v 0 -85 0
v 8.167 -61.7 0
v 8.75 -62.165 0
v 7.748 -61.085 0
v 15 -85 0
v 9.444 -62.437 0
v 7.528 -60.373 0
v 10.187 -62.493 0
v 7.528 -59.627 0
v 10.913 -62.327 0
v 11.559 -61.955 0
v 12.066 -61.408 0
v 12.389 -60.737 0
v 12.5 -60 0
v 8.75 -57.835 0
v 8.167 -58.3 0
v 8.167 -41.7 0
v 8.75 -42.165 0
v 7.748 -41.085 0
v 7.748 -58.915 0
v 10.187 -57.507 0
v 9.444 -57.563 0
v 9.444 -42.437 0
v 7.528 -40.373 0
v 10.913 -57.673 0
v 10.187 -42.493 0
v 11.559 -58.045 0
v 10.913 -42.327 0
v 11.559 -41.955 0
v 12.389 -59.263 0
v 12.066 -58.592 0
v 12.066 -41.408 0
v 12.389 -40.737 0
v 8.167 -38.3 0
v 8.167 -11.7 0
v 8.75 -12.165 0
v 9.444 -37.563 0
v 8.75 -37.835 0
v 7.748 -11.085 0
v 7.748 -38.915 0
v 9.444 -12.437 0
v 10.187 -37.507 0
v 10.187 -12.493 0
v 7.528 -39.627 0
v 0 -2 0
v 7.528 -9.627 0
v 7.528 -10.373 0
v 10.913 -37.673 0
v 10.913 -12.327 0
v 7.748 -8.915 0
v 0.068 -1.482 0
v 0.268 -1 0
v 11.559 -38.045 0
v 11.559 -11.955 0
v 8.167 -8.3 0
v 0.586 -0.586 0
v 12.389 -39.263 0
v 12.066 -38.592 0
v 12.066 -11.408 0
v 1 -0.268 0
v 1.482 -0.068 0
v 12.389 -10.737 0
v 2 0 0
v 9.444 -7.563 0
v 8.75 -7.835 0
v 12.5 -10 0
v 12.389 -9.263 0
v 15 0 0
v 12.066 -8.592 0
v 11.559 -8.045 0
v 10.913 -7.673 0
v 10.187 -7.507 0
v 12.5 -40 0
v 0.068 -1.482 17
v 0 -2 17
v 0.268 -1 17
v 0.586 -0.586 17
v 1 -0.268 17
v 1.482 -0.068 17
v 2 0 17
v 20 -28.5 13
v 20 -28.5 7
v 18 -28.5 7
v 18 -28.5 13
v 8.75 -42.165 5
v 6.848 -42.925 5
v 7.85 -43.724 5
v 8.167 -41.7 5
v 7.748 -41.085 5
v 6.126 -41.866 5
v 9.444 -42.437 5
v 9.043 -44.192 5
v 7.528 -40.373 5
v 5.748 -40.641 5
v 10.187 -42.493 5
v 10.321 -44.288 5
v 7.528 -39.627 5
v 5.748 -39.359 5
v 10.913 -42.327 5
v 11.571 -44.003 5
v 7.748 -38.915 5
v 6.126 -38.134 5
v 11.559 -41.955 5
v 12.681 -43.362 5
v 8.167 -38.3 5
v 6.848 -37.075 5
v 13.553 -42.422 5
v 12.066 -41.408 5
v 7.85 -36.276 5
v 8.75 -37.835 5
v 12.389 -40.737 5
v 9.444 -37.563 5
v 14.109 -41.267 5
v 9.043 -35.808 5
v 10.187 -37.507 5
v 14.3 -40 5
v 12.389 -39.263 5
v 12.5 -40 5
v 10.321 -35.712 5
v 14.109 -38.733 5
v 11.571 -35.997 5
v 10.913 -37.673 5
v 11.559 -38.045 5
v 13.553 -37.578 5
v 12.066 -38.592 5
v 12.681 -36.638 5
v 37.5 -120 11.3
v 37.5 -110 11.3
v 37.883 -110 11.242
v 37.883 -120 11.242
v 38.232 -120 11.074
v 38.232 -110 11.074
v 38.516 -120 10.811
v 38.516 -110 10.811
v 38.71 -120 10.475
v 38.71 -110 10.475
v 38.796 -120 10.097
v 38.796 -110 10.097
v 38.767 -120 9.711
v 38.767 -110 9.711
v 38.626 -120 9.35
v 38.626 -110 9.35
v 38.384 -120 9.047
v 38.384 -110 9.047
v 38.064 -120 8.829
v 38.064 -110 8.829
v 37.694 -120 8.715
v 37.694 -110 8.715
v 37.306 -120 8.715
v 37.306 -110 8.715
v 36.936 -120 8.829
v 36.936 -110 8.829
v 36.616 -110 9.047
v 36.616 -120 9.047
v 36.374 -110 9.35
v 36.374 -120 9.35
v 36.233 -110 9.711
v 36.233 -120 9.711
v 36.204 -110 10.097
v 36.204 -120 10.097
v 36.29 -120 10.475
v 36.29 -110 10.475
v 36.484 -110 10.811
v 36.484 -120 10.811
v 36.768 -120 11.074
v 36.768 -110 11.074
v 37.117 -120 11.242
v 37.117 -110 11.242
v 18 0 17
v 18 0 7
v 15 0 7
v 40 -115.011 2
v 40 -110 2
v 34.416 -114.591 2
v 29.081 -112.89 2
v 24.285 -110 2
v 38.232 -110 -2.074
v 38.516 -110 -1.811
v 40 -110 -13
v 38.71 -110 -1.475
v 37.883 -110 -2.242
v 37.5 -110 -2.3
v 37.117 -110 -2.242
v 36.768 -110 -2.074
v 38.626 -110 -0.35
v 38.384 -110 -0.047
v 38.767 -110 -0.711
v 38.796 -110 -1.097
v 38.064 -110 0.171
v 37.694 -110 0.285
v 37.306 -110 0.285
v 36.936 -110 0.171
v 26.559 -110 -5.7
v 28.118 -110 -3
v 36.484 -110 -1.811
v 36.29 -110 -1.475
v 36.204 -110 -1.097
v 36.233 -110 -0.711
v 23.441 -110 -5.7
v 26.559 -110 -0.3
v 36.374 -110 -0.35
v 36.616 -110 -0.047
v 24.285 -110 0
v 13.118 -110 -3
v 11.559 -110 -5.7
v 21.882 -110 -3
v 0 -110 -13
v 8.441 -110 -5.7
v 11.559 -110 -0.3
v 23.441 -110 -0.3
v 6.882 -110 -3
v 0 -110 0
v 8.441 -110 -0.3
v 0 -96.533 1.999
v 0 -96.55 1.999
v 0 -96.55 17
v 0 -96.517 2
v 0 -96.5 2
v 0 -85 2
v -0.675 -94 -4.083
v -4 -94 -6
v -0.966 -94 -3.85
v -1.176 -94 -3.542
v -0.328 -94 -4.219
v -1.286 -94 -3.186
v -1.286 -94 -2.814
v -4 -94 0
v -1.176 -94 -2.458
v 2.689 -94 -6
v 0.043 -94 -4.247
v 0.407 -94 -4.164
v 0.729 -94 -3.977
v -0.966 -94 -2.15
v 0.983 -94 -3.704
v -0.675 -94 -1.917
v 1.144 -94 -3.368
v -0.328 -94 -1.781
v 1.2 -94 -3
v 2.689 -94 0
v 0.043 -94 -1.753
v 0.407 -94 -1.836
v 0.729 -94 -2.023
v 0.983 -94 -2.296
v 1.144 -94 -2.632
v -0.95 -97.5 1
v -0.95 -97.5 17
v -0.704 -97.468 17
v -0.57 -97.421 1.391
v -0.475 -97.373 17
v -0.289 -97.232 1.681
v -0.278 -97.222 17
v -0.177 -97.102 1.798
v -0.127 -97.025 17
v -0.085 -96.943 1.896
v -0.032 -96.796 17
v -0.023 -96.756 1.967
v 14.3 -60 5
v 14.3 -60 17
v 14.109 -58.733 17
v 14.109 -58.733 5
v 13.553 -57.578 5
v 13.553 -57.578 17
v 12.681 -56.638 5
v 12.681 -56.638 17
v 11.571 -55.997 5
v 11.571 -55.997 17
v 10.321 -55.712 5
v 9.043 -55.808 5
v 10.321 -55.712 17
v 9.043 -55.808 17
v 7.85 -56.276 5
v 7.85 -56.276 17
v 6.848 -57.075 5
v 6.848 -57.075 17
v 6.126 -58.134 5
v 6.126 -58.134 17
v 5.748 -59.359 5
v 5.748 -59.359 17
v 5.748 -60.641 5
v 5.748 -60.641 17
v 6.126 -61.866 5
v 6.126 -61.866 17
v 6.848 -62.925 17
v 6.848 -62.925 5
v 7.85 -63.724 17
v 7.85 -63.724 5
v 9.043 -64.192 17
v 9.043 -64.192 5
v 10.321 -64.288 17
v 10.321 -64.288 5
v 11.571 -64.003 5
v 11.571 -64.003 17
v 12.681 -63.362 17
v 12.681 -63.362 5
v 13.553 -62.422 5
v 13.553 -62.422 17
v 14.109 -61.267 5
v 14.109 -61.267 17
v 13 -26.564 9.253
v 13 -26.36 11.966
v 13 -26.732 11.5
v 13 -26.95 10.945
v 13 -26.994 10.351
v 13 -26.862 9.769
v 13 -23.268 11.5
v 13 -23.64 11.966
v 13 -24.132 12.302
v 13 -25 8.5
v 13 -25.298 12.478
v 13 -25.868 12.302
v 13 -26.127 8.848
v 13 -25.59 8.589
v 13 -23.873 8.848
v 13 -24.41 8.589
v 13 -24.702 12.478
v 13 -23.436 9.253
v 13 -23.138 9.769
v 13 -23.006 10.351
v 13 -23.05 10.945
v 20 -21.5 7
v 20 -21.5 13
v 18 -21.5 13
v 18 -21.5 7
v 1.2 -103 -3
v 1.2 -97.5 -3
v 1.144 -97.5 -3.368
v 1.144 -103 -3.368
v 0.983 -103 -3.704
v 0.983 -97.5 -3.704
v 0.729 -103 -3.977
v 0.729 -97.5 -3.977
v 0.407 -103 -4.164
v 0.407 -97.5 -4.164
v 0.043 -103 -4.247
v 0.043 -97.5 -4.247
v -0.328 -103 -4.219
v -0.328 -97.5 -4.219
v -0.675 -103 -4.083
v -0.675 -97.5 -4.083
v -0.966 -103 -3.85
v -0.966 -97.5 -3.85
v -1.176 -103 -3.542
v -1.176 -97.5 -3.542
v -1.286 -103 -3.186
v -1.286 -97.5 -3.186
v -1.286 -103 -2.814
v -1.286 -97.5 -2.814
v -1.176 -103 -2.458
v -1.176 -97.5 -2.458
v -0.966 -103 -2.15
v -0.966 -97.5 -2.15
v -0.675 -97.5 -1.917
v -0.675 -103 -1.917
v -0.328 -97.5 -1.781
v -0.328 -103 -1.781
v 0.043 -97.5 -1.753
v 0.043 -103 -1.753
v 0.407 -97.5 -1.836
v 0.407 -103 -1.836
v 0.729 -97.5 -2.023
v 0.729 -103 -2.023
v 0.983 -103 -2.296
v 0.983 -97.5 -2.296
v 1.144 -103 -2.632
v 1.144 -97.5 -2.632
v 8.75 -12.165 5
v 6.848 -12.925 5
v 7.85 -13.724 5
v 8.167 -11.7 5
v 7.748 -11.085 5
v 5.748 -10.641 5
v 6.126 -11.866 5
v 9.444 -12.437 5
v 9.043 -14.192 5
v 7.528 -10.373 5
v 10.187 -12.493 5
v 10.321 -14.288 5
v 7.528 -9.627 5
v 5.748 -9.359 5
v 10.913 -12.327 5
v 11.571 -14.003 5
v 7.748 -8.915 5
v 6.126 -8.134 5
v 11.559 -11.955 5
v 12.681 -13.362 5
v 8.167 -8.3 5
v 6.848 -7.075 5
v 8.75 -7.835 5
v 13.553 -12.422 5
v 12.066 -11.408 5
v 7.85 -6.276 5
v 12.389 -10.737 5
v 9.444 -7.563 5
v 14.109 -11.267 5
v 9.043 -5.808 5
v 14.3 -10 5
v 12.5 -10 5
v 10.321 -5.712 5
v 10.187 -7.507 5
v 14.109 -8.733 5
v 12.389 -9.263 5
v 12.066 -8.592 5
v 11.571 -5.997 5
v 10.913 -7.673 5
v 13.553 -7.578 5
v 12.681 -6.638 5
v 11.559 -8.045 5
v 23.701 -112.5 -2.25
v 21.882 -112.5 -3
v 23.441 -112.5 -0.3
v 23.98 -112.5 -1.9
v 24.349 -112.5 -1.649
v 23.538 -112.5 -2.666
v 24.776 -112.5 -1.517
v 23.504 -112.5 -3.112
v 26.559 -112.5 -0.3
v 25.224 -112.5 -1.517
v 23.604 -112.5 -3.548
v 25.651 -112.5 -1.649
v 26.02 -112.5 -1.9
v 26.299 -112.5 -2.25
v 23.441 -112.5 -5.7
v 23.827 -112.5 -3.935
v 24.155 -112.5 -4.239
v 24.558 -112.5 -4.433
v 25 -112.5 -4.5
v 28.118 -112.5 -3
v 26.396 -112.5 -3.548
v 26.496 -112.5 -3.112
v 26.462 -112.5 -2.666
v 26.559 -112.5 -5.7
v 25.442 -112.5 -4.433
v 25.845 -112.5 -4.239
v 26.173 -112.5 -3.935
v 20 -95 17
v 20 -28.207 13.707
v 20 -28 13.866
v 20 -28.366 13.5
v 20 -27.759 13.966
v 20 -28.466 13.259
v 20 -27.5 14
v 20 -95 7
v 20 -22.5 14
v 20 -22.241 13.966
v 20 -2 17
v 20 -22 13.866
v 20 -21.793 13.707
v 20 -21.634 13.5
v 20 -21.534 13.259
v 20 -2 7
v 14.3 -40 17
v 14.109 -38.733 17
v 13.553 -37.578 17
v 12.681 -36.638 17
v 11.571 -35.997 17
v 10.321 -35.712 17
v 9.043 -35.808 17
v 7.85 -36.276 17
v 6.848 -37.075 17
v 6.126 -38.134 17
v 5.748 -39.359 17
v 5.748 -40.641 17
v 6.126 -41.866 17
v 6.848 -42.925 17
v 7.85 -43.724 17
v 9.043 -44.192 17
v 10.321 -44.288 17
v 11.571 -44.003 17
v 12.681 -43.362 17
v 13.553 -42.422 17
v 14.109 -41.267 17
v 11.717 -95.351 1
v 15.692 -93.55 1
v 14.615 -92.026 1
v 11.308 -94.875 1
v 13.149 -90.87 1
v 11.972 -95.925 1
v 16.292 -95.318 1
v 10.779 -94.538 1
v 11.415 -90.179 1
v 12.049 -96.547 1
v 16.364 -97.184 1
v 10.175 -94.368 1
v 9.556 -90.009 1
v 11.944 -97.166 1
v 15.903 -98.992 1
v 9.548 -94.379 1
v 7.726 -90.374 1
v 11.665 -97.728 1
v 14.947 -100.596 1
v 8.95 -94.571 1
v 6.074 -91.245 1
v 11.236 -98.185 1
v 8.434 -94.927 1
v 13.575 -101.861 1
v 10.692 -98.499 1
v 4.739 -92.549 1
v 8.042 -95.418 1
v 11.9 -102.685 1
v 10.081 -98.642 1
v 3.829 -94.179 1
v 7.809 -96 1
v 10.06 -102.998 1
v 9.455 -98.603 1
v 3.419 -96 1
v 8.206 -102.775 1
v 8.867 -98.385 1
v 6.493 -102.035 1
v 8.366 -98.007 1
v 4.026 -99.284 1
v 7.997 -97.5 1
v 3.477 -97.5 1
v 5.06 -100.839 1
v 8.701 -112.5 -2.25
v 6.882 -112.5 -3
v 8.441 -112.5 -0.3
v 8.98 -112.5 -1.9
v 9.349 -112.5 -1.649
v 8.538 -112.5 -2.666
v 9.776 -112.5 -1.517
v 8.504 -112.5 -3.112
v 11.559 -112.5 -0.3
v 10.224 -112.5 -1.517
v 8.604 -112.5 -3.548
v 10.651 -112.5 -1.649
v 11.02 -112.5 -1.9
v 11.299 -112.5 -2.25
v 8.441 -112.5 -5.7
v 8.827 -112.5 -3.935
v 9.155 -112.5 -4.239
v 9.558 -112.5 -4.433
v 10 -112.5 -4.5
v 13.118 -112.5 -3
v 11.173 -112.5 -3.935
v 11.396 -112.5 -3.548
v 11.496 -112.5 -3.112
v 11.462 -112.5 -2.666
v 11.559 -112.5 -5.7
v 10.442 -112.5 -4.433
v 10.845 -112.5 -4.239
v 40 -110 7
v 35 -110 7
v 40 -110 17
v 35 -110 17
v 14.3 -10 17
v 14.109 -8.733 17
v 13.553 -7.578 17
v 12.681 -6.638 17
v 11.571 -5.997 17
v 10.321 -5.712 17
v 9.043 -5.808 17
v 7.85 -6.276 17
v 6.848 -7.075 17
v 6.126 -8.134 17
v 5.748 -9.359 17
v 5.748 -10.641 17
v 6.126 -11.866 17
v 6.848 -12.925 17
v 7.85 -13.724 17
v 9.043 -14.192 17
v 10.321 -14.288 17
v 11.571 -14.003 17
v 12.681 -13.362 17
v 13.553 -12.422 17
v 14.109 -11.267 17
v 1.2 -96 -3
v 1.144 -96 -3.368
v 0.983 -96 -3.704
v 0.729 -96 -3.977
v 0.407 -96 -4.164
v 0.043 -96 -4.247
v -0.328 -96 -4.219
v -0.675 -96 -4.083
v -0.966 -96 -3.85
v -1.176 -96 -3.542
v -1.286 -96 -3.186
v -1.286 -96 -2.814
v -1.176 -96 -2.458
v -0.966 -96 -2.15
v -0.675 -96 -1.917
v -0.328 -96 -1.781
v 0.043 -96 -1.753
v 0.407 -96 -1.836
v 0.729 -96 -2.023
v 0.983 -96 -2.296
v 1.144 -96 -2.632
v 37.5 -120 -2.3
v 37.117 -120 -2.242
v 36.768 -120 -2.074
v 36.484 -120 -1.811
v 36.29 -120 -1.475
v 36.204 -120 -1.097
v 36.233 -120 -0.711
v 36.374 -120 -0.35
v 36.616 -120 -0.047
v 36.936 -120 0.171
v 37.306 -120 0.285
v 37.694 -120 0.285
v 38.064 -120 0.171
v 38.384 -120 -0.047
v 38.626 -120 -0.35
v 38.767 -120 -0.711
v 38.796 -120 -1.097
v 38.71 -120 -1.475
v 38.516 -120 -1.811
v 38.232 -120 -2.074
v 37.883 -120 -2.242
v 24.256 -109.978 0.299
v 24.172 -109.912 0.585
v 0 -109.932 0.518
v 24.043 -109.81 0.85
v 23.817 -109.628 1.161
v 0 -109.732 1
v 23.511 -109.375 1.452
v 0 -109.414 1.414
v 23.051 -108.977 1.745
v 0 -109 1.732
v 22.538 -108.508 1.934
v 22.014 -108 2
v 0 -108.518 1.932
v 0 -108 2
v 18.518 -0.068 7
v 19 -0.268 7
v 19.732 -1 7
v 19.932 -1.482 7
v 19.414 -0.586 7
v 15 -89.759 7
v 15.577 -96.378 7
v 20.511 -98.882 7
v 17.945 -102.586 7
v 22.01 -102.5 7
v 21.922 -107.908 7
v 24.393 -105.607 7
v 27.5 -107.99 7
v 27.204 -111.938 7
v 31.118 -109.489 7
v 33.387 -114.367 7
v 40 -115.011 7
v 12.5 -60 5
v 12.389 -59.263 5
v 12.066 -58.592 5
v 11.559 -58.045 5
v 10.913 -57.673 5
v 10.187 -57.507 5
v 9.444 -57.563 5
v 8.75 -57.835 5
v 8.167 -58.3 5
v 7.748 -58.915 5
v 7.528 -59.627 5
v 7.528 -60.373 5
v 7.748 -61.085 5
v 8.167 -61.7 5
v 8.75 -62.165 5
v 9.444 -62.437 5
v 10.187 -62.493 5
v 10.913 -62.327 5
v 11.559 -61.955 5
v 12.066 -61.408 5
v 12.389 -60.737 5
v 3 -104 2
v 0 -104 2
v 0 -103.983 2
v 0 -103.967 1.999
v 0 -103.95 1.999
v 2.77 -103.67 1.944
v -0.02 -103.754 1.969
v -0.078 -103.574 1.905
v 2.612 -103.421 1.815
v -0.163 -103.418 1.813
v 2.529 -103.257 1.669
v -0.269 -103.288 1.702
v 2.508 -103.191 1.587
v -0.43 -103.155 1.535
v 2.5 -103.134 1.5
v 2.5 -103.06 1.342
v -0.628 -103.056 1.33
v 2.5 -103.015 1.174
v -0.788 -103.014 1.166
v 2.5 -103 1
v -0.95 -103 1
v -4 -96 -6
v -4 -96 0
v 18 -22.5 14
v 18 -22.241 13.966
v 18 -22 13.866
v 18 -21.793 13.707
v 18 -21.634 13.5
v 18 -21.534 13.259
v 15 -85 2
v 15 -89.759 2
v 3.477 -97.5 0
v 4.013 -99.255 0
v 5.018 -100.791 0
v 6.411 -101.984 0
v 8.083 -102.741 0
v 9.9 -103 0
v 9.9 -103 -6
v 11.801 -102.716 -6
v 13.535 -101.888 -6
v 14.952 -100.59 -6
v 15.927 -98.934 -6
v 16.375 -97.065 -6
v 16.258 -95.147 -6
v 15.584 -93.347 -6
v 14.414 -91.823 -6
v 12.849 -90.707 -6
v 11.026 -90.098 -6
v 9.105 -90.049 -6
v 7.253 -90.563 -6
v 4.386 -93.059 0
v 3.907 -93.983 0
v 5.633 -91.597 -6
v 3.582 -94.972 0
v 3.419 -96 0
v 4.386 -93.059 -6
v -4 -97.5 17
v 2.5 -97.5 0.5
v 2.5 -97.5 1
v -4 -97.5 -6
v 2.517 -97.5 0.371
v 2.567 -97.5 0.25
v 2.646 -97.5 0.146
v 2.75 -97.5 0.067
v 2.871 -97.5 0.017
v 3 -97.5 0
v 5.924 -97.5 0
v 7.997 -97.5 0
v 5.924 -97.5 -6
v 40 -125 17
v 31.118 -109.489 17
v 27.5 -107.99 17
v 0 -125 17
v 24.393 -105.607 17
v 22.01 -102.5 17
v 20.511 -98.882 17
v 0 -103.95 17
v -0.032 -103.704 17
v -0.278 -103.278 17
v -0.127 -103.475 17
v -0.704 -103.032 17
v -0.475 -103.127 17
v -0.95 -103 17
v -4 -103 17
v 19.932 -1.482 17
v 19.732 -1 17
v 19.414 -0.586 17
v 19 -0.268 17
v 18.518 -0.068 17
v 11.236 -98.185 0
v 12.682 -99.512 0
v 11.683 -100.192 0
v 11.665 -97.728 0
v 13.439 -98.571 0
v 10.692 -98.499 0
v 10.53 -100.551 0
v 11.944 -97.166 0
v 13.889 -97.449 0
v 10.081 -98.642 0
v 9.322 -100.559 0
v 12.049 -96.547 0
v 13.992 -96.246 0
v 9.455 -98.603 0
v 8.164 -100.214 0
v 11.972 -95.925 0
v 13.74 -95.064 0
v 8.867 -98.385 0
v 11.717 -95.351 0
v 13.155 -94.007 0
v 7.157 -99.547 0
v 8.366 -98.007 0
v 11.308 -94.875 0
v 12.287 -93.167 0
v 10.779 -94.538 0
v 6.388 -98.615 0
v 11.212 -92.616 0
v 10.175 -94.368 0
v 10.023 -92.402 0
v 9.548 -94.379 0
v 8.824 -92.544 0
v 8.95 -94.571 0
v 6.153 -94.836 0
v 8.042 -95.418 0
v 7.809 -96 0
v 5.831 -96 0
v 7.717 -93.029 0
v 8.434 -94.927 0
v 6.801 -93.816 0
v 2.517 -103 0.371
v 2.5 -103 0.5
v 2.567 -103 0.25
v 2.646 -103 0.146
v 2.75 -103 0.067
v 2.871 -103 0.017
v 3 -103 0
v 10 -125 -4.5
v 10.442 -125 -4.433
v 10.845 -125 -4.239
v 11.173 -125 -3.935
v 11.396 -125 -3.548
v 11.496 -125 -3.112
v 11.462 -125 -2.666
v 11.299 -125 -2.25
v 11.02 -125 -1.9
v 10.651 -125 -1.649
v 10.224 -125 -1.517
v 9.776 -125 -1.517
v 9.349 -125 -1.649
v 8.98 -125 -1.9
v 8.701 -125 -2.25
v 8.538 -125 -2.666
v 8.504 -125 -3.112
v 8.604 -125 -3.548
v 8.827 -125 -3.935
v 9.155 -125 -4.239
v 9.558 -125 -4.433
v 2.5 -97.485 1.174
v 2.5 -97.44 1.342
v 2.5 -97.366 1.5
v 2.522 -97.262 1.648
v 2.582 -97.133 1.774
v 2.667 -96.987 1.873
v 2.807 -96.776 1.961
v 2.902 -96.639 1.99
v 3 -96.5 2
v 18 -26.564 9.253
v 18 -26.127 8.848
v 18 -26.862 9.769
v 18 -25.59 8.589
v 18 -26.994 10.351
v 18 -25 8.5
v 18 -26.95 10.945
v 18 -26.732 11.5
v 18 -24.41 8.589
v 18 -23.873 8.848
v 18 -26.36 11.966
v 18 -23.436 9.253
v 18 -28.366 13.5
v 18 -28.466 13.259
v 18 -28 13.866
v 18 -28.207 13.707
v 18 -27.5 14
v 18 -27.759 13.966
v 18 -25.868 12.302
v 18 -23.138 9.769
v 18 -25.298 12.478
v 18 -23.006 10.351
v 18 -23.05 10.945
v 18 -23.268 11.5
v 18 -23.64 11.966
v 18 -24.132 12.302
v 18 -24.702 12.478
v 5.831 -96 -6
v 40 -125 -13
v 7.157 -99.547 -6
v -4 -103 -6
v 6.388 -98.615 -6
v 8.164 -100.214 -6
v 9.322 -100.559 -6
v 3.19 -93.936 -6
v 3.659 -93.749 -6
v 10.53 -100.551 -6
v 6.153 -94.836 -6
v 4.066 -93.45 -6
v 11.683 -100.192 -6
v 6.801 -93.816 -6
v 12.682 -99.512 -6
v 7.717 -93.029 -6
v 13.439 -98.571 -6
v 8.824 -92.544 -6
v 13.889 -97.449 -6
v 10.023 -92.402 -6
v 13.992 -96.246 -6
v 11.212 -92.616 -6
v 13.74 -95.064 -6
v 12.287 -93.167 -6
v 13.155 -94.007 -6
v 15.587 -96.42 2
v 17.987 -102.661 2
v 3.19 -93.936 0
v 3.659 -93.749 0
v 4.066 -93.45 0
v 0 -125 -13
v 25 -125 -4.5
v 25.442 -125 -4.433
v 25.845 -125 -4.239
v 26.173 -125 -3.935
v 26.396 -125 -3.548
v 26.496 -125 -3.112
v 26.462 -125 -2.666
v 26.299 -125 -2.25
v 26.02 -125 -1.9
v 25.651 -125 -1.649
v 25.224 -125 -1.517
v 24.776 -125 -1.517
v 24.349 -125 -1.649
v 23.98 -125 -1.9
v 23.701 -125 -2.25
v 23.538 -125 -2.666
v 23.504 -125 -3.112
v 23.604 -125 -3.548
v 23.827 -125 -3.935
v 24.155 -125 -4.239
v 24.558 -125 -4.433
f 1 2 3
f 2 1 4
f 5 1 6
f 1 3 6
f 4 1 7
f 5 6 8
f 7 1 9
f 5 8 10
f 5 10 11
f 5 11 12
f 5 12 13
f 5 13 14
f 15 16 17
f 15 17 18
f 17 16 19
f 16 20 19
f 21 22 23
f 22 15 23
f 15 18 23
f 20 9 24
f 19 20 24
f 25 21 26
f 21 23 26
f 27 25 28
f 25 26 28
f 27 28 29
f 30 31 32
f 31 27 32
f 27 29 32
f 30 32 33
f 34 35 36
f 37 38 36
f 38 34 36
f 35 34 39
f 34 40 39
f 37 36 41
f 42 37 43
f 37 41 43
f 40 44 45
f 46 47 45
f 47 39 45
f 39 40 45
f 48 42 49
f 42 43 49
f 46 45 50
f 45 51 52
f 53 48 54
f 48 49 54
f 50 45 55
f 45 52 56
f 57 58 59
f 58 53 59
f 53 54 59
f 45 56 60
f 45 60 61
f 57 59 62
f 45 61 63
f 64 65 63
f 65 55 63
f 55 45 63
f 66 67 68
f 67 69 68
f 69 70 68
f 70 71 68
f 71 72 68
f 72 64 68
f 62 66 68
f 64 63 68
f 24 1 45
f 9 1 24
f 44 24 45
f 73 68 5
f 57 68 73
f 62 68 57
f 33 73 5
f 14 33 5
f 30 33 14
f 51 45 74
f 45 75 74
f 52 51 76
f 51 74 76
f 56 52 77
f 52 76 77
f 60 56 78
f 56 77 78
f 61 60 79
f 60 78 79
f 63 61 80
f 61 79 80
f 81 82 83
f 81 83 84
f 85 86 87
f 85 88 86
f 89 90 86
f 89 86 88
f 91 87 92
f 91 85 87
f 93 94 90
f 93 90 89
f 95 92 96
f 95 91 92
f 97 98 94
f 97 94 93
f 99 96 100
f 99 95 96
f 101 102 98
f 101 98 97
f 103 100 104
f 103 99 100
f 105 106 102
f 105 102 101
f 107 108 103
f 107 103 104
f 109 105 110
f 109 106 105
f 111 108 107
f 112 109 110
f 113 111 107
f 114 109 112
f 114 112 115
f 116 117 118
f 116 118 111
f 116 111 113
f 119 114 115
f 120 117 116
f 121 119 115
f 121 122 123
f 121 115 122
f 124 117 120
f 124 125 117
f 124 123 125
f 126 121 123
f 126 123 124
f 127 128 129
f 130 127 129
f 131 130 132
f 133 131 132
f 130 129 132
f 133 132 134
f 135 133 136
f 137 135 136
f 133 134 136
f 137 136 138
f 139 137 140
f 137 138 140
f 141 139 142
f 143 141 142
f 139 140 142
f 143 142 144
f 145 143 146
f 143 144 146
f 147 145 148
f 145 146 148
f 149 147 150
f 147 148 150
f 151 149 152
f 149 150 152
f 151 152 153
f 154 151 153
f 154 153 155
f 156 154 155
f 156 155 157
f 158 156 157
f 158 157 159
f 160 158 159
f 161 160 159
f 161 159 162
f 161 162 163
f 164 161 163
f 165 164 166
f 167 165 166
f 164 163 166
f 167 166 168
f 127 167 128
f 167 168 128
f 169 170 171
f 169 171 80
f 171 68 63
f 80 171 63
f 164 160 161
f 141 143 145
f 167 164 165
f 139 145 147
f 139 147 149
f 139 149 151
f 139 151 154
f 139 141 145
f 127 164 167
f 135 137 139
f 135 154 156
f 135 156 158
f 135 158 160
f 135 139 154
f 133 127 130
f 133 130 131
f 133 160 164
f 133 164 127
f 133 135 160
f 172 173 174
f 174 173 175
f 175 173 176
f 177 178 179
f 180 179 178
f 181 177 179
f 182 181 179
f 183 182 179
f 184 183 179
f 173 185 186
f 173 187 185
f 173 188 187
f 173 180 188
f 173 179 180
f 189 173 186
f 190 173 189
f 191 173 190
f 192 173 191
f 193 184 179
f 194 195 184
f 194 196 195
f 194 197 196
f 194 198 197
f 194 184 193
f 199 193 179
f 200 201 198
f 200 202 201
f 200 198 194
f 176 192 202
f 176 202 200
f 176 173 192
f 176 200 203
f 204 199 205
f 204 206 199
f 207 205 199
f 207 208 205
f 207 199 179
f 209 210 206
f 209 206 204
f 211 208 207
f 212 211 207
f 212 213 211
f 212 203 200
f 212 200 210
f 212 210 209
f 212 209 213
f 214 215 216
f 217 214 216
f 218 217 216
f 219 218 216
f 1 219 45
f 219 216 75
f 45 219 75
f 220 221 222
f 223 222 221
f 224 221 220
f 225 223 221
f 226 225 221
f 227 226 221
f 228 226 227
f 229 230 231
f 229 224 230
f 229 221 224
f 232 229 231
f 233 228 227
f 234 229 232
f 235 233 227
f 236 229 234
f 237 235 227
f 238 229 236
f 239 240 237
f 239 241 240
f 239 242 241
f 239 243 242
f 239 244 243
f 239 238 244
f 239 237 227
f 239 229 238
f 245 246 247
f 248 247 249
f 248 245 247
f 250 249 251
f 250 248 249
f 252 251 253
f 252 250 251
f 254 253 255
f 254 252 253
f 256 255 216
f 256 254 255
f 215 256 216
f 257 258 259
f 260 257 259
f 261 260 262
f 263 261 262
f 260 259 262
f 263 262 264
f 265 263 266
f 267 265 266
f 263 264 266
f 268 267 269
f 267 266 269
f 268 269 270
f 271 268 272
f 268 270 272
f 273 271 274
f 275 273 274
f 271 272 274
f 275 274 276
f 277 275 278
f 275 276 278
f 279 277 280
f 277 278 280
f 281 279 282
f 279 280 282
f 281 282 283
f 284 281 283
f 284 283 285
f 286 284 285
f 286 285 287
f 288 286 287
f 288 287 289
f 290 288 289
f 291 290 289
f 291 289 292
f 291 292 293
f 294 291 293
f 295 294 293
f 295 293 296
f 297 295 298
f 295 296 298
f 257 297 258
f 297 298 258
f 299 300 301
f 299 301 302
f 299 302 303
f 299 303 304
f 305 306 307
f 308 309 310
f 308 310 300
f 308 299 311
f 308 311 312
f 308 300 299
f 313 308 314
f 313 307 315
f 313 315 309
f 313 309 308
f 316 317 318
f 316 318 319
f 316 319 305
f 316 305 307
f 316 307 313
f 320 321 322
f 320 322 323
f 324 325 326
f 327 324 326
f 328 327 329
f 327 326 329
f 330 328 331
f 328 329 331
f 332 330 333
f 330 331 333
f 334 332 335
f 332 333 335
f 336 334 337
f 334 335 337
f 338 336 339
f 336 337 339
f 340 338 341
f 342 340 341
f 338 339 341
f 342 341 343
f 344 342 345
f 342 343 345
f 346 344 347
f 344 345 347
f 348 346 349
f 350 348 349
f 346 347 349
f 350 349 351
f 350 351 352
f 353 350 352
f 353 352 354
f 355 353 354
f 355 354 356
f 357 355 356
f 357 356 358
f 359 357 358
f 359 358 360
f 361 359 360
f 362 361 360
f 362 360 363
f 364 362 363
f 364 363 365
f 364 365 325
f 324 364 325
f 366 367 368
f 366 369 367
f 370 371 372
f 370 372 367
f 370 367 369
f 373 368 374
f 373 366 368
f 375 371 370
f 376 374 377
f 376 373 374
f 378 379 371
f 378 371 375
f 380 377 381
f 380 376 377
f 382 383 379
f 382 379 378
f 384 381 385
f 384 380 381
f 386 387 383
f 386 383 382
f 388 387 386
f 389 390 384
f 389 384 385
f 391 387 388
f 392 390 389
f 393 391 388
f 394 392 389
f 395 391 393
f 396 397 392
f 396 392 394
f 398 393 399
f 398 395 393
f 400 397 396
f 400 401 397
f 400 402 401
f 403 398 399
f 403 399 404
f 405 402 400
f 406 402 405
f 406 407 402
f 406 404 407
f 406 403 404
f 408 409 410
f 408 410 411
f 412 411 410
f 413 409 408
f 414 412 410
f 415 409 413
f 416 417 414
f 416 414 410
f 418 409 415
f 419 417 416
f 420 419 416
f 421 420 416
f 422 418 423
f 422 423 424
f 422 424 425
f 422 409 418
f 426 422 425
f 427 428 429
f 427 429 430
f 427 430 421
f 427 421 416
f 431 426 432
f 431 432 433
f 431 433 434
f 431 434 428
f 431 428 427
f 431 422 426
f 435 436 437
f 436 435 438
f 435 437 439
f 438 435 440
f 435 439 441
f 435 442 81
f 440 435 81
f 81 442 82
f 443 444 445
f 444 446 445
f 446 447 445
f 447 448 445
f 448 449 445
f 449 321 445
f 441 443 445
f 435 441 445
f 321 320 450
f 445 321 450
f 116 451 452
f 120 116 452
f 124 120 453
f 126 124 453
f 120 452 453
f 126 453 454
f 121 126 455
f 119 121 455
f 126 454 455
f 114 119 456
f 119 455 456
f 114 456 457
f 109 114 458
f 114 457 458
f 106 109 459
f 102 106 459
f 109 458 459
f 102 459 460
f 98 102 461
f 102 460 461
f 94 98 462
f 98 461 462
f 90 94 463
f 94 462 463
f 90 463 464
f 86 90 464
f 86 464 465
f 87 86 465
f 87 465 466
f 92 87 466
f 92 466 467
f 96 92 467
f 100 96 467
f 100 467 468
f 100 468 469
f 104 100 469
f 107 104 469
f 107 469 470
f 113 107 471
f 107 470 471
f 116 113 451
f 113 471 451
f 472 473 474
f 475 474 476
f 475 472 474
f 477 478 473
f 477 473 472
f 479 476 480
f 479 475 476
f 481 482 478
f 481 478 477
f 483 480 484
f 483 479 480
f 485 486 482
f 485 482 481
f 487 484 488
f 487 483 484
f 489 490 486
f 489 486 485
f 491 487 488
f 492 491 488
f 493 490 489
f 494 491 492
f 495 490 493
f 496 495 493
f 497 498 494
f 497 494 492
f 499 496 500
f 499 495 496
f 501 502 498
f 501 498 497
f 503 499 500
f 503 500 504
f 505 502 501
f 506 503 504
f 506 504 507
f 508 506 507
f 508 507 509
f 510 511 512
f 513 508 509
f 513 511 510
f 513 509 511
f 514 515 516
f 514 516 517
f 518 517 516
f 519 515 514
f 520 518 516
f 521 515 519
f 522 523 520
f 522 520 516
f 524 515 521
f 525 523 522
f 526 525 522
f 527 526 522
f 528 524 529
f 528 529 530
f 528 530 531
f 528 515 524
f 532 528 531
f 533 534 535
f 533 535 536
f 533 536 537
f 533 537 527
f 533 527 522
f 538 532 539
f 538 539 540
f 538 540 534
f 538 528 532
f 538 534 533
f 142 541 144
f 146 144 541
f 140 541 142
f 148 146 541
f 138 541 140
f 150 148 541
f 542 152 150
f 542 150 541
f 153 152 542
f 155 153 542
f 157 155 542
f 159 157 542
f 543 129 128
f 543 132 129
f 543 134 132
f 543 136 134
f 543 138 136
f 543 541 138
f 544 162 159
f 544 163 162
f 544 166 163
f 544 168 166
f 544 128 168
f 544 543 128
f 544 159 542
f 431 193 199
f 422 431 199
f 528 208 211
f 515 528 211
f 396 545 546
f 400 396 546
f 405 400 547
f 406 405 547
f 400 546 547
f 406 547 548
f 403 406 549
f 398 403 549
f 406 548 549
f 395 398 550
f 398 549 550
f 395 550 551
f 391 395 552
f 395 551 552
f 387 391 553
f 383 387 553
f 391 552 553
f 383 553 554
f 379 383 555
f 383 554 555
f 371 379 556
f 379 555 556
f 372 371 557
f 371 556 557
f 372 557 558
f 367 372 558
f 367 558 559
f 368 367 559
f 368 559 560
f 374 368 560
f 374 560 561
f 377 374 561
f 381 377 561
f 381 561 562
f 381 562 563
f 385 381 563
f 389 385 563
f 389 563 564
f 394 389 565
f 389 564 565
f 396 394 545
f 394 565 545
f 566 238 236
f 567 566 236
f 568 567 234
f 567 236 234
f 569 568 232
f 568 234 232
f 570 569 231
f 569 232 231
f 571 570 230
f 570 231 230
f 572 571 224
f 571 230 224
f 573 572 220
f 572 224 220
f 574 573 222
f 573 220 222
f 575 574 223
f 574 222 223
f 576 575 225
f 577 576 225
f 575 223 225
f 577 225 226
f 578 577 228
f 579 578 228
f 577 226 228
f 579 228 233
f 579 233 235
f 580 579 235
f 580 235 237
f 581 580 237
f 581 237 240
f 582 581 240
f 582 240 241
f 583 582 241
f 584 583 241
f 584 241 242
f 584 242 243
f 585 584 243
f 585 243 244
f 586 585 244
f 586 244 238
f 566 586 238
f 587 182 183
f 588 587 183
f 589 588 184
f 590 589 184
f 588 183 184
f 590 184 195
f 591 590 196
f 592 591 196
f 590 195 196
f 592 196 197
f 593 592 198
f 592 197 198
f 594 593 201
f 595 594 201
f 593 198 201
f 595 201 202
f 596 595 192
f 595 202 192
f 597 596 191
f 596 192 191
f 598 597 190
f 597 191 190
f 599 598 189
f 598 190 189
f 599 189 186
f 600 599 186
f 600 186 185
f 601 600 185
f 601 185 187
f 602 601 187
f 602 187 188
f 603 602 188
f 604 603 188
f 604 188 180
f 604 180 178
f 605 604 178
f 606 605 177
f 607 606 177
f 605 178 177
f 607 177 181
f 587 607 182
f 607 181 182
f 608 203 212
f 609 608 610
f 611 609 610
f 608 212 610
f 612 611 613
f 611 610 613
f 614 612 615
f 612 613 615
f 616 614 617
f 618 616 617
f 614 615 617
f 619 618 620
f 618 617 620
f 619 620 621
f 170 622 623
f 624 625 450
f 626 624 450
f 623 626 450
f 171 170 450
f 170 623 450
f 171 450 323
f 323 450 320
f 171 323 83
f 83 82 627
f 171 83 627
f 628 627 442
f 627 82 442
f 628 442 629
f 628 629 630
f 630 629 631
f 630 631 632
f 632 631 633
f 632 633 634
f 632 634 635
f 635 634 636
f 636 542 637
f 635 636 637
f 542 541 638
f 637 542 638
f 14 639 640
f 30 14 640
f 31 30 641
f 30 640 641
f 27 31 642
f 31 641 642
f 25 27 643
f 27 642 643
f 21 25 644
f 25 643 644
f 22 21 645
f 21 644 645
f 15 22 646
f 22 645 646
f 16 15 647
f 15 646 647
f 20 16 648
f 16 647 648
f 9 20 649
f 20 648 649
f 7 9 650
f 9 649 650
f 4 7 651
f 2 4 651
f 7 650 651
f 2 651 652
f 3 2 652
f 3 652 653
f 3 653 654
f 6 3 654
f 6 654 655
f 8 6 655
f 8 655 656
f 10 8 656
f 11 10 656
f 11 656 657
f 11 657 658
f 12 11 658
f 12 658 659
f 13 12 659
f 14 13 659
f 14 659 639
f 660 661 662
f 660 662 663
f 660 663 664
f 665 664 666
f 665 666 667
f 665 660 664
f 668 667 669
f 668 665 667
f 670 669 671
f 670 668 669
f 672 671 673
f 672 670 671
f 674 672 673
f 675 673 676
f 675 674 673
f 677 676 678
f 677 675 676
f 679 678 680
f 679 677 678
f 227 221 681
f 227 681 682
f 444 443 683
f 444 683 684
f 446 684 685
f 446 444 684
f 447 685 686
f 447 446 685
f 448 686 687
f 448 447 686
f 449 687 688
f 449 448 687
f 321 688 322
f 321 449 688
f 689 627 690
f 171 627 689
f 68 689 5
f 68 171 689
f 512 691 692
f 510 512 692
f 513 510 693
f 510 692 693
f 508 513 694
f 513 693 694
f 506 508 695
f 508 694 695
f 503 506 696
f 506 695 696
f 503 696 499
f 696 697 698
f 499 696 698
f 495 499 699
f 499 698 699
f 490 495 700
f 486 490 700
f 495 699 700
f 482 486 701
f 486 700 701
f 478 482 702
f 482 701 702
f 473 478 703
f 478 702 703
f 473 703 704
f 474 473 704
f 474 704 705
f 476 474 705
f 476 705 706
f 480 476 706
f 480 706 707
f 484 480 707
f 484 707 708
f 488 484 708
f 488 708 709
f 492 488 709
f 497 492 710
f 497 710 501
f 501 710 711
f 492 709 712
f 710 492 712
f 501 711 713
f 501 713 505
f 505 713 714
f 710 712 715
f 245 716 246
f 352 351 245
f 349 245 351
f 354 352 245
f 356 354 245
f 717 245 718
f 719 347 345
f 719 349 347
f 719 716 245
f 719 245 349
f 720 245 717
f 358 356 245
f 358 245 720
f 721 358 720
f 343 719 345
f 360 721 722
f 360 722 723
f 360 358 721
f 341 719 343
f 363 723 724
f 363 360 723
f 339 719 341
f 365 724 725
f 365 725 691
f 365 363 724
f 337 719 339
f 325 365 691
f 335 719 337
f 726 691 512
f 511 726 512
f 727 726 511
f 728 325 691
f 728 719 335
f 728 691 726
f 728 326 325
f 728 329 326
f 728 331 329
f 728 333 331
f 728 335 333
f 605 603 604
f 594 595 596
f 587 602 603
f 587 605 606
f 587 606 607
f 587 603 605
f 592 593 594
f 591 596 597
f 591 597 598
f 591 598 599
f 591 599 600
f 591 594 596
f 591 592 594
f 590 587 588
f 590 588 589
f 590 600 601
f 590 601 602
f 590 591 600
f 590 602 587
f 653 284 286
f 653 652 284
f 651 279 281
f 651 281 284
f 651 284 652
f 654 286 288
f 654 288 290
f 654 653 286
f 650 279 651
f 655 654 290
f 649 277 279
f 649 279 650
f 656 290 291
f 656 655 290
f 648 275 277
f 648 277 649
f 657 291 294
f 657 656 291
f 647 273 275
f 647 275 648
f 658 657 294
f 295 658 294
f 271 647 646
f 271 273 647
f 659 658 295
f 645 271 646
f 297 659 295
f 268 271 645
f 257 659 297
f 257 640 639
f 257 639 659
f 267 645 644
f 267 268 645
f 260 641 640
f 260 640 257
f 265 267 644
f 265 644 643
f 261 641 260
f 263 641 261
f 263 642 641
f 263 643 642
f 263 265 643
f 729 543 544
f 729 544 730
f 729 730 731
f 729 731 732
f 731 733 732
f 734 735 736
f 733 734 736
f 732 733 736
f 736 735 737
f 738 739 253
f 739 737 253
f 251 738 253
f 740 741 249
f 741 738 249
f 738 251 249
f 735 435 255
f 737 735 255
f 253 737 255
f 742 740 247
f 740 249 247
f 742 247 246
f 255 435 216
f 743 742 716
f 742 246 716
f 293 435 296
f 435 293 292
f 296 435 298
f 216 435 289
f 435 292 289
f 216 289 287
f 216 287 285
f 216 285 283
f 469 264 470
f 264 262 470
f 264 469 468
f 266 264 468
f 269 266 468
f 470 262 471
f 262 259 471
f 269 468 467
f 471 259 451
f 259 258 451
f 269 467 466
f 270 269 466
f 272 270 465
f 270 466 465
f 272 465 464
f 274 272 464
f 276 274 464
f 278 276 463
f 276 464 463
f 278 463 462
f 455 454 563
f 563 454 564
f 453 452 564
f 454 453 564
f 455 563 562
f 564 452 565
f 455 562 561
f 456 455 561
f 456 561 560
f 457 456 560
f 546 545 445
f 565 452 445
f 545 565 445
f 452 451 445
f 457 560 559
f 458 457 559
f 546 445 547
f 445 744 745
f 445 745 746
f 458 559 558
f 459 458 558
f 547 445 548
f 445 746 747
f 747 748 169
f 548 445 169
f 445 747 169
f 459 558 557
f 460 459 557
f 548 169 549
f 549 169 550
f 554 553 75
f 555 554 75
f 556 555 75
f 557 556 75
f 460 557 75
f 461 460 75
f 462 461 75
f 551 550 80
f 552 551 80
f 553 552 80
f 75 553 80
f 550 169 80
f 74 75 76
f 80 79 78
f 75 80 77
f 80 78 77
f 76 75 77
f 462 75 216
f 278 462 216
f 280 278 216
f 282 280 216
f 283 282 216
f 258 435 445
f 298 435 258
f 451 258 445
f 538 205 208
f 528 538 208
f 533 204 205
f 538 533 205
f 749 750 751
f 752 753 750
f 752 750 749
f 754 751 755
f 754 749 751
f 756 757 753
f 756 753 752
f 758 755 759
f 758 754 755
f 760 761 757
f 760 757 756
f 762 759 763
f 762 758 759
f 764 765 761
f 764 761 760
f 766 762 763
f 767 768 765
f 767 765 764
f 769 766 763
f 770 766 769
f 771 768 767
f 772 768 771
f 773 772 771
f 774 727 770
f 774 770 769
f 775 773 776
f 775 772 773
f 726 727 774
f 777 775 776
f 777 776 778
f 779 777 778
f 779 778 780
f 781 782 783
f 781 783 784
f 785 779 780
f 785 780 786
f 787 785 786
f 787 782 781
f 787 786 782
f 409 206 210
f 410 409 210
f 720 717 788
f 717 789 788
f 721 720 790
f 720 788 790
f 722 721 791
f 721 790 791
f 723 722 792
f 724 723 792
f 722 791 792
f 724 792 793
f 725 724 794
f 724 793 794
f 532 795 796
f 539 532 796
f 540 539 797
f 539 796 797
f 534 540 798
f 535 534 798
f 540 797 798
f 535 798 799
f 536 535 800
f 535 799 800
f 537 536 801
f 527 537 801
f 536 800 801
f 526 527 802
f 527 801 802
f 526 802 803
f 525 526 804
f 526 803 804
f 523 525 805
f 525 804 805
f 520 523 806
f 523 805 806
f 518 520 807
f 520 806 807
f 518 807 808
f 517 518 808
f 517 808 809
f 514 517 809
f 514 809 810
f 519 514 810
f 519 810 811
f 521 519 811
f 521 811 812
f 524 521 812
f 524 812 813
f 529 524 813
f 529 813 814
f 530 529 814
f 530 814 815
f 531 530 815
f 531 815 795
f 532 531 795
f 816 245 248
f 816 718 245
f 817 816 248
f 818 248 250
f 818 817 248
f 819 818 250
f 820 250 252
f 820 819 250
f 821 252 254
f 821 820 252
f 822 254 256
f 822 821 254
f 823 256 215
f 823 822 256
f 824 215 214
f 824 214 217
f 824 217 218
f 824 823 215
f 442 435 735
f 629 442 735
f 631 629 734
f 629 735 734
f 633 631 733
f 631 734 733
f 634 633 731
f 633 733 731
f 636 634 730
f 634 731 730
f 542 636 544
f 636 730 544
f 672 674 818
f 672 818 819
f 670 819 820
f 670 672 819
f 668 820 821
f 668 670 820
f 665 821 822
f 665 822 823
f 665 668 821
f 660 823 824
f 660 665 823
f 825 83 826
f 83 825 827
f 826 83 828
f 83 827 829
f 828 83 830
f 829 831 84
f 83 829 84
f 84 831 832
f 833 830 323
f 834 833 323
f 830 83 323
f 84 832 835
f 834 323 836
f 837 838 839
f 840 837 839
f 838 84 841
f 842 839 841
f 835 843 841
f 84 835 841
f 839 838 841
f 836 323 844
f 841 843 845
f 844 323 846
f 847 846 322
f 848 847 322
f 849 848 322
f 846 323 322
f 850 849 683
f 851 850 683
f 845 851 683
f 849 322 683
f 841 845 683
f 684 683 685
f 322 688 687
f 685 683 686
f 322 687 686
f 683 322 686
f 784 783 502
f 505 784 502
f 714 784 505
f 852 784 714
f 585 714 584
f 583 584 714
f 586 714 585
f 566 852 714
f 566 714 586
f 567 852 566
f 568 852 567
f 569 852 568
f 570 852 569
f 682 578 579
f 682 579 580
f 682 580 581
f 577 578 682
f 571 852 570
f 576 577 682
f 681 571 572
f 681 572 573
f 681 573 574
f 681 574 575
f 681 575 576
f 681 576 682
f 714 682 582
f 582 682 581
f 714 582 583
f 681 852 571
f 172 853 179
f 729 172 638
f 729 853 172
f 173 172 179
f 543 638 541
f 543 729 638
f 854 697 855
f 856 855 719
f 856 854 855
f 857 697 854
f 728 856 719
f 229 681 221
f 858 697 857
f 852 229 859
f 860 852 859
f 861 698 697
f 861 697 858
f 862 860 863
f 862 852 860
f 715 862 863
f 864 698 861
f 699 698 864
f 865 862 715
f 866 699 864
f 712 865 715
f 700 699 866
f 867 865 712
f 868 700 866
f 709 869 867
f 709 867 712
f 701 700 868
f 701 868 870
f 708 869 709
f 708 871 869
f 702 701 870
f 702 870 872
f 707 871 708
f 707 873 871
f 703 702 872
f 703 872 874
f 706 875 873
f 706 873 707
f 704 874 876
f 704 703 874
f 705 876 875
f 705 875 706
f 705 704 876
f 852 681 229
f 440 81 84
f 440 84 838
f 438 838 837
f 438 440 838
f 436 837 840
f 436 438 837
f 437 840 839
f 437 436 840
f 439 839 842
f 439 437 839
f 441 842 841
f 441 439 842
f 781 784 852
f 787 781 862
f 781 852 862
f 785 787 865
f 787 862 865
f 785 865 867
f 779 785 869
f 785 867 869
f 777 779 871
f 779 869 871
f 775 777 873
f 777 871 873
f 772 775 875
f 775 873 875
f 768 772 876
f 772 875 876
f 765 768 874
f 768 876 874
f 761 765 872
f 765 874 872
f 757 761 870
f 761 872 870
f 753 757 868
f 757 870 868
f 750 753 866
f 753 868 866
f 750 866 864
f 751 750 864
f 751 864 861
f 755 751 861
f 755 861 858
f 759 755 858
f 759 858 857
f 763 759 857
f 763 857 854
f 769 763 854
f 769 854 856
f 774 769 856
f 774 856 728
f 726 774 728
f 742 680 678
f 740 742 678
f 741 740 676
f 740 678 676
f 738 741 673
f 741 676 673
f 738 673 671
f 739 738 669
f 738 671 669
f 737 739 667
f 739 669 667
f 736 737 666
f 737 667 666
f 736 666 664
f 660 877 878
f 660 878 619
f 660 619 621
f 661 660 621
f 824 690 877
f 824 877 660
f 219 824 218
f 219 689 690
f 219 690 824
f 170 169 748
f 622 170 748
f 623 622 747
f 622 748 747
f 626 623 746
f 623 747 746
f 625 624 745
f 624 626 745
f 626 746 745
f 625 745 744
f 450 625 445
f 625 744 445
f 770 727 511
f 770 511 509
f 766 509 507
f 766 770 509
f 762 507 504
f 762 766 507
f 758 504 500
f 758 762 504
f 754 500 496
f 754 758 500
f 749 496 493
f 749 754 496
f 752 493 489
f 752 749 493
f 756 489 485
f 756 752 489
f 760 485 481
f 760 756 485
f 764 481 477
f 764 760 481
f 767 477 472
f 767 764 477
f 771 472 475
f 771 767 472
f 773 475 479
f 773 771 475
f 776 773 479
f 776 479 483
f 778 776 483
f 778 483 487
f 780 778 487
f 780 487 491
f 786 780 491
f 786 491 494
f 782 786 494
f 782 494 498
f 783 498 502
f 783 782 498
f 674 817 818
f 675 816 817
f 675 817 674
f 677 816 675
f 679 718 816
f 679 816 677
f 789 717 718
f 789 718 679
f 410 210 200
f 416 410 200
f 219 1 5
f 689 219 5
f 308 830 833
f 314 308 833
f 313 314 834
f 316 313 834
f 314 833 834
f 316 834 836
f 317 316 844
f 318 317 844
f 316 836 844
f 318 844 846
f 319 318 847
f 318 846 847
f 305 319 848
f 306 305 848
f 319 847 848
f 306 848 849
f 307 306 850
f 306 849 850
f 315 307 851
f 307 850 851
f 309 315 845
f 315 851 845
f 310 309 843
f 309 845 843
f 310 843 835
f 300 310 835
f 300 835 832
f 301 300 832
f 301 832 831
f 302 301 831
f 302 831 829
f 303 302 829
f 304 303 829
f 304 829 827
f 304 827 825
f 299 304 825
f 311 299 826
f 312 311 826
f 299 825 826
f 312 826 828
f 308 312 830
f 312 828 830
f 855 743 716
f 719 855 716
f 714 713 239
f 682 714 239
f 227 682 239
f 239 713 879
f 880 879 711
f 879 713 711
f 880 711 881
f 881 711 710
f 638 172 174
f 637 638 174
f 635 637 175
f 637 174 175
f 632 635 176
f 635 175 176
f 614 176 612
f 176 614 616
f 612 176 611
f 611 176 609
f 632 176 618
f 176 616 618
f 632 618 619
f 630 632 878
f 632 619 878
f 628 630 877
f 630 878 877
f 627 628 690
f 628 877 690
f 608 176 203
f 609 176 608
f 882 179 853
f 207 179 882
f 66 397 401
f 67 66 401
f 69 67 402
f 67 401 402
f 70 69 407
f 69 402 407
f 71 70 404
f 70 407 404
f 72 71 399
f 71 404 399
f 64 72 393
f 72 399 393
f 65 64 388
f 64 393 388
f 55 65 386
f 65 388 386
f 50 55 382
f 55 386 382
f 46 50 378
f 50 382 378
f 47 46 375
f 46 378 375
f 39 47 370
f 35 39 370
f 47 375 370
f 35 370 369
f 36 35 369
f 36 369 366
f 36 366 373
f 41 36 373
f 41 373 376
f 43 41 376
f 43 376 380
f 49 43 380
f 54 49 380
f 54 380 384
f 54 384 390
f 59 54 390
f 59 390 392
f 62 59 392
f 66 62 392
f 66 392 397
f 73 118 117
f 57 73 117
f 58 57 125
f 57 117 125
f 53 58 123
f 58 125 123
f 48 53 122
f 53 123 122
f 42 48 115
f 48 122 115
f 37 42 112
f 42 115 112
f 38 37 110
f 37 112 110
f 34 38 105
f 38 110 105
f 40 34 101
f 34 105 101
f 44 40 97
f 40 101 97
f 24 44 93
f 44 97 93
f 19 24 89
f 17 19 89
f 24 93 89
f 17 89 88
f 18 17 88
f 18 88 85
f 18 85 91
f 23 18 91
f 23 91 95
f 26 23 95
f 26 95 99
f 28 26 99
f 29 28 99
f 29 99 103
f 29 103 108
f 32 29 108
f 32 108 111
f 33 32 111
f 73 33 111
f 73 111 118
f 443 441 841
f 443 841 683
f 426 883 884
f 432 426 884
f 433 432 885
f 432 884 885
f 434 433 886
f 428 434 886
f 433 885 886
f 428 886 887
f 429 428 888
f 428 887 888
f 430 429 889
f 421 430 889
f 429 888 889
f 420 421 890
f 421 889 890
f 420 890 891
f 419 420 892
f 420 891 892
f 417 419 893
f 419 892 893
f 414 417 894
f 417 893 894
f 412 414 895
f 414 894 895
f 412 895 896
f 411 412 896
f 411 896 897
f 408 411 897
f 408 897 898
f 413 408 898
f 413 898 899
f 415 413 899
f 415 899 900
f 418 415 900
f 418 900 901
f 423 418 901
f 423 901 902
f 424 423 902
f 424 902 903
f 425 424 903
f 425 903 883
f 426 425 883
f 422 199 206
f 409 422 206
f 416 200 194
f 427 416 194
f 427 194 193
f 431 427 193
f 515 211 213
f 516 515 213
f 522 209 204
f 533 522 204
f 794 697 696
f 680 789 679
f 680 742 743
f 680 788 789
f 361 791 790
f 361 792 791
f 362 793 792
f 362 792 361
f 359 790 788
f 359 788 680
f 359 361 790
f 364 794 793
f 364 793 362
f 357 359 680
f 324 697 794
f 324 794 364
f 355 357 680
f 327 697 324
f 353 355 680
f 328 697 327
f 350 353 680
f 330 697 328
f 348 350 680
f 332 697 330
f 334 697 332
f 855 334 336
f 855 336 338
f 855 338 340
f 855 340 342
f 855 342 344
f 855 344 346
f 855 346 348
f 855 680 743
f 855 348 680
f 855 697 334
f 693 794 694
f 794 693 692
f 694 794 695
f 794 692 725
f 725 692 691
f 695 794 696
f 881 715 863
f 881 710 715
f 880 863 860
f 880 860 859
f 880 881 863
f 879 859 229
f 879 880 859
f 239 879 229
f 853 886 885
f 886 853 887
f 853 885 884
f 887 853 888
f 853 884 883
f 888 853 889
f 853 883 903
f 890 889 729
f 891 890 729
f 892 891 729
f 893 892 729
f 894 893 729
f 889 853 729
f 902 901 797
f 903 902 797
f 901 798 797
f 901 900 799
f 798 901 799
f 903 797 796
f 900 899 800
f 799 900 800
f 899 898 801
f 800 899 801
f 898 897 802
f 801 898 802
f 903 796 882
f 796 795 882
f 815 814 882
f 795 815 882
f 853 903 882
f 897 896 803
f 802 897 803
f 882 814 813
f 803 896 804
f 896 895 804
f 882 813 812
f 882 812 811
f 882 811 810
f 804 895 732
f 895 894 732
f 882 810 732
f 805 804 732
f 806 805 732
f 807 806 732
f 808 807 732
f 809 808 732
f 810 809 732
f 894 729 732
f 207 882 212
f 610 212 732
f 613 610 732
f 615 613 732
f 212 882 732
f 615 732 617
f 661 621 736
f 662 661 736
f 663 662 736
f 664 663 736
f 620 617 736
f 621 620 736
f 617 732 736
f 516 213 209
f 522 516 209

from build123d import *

# Parameters (mm, degrees)
BOSS_EXTRUDE1_DEPTH = 17
SKETCH3_W           = 40
SKETCH3_H           = 15
BOSS_EXTRUDE3_DEPTH = 13
FILLET1_R           = 15
SKETCH4_R           = 1.5000000000000004
SKETCH4_R_2         = 1.5000000000000007
CUT_EXTRUDE1_DEPTH  = 20
CUT_EXTRUDE2_DEPTH  = 2.5
SKETCH6_R           = 4.299999999999999
SKETCH6_R_2         = 4.299999999999998
SKETCH6_R_3         = 4.3
CUT_EXTRUDE3_DEPTH  = 12
SKETCH7_R           = 2.5000000000000004
SKETCH7_R_2         = 2.500000000000001
CUT_EXTRUDE4_DEPTH  = 12
CUT_EXTRUDE5_DEPTH  = 2
BOSS_EXTRUDE4_DEPTH = 23
BOSS_EXTRUDE5_DEPTH = 6
SKETCH11_W          = 6
SKETCH11_H          = 2
BOSS_EXTRUDE6_DEPTH = 4.419259302
SKETCH12_R          = 1.2500000000000002
CUT_EXTRUDE7_DEPTH  = 10
FILLET4_R           = 0.95
FILLET6_R           = 2
SKETCH13_R          = 6.500000000000007
SKETCH13_R_2        = 2.150000000000001
BOSS_EXTRUDE7_DEPTH = 1
SKETCH14_W          = 13.249650970727469
SKETCH14_H          = 1.5
CUT_EXTRUDE8_DEPTH  = 7
BOSS_EXTRUDE8_DEPTH = 10
SKETCH16_R          = 4.100000000000001
CUT_EXTRUDE9_DEPTH  = 6
CUT_EXTRUDE10_DEPTH = 5
SKETCH18_R          = 24.032057078793116
CUT_EXTRUDE11_DEPTH = 5
SKETCH20_R          = 1.3000000000000016
CUT_EXTRUDE12_DEPTH = 10
FILLET7_R           = 0.5
FILLET8_R           = 2
FILLET9_R           = 2
FILLET10_R          = 1
FILLET11_R          = 1
CUT_EXTRUDE15_DEPTH = 2
SKETCH24_R          = 2
CUT_EXTRUDE16_DEPTH = 5


with BuildPart() as part:
    # Sketch1 → Boss-Extrude1 (new body)
    with BuildSketch(Plane.XY):
        Polygon((0, 0), (1.531e-14, -125), (40.000000000000014, -125), (40.000000000000014, -110), (20.000000000000014, -110), (20.000000000000014, 0), align=None)
    extrude(amount=BOSS_EXTRUDE1_DEPTH)

    # Sketch3 → Boss-Extrude3 (add)
    with BuildSketch(Plane(origin=(0, 0, 0), x_dir=(-1, 0, 0), z_dir=(0, 0, -1))):
        with Locations((-20.000000000000014, -117.50000000000001)):
            Rectangle(SKETCH3_W, SKETCH3_H)
    extrude(amount=BOSS_EXTRUDE3_DEPTH)

    # Fillet1
    fillet1_edges = [part.edges().sort_by_distance(p)[0] for p in [
        (20.000000000000014, -110, 8.5),
    ]]
    fillet(fillet1_edges, radius=FILLET1_R)

    # Sketch4 → Cut-Extrude1 (cut)
    with BuildSketch(Plane.XZ.offset(125)):
        with Locations(Location((10.000000000000016, -2.999999999999999, 0), (0, 0, 270))):
            Circle(SKETCH4_R)
        with Locations(Location((25.000000000000014, -2.999999999999999, 0), (0, 0, 270))):
            Circle(SKETCH4_R_2)
    extrude(amount=-CUT_EXTRUDE1_DEPTH, mode=Mode.SUBTRACT)

    # Sketch5 → Cut-Extrude2 (cut)
    with BuildSketch(Plane(origin=(0, -110, 0), x_dir=(1, 0, 0), z_dir=(0, 1, 0))):
        Polygon((6.882308546376037, 3.0000000000000013), (8.441154273188026, 0.2999999999999986), (11.558845726812006, 0.2999999999999995), (13.117691453623996, 3.0000000000000018), (11.558845726812008, 5.7), (8.441154273188026, 5.699999999999998), align=None)
        Polygon((21.882308546376034, 2.999999999999999), (23.441154273188026, 0.2999999999999969), (26.558845726812, 0.29999999999999777), (28.117691453623994, 2.999999999999999), (26.558845726812, 5.6999999999999975), (23.441154273188022, 5.699999999999997), align=None)
    extrude(amount=-CUT_EXTRUDE2_DEPTH, mode=Mode.SUBTRACT)

    # Sketch6 → Cut-Extrude3 (cut)
    with BuildSketch(Plane.XY.offset(17)):
        with Locations((10.000000000000009, -10.000000000000002)):
            Circle(SKETCH6_R)
        with Locations((10.000000000000012, -40)):
            Circle(SKETCH6_R_2)
        with Locations((10.000000000000014, -60)):
            Circle(SKETCH6_R_3)
    extrude(amount=-CUT_EXTRUDE3_DEPTH, mode=Mode.SUBTRACT)

    # Sketch7 → Cut-Extrude4 (cut)
    with BuildSketch(Plane.XY.offset(5.000000000000001)):
        with Locations((10.000000000000009, -10.000000000000002)):
            Circle(SKETCH7_R)
        with Locations((10.000000000000012, -40)):
            Circle(SKETCH7_R_2)
        with Locations((10.000000000000014, -60)):
            Circle(SKETCH7_R_2)
    extrude(amount=-CUT_EXTRUDE4_DEPTH, mode=Mode.SUBTRACT)

    # Sketch8 → Cut-Extrude5 (cut)
    with BuildSketch(Plane(origin=(0, 0, 0), x_dir=(-1, 0, 0), z_dir=(0, 0, -1))):
        Polygon((-1.531e-14, -110), (-3.06e-15, -84.99999999999999), (-40.000000000000014, -84.99999999999999), (-40.000000000000014, -110), align=None)
    extrude(amount=-CUT_EXTRUDE5_DEPTH, mode=Mode.SUBTRACT)

    # Sketch9 → Boss-Extrude4 (add)
    with BuildSketch(Plane.XY.offset(17)):
        Polygon((-2.69e-15, -103.00000000000001), (-4, -103.00000000000001), (-4, -97.5), (0, -97.5), align=None)
    extrude(amount=-BOSS_EXTRUDE4_DEPTH)

    # Sketch10 → Boss-Extrude5 (add)
    with BuildSketch(Plane(origin=(0, 0, -5.999999999999998), x_dir=(-1, 0, 0), z_dir=(0, 0, -1))):
        with BuildLine():
            Line((4, -103.00000000000001), (-9.9, -103.00000000000001))
            ThreePointArc((-9.9, -103.00000000000001), (-15.308326913195994, -92.894448724536), (-3.8999999999999964, -94))
            Line((-3.8999999999999964, -94), (-0.41925930159213404, -94))
            Line((-0.41925930159213404, -94), (-0.41925930159213404, -96))
            Line((-0.41925930159213404, -96), (-5.931373033403113, -96))
            ThreePointArc((-5.931373033403113, -96), (-13.892119004323362, -96.24903017049799), (-6.025237793012059, -97.49308501111332))
            Line((-6.025237793012059, -97.49308501111332), (4, -97.5))
            Line((4, -97.5), (4, -103.00000000000001))
        make_face()
    extrude(amount=-BOSS_EXTRUDE5_DEPTH)

    # Sketch11 → Boss-Extrude6 (add)
    with BuildSketch(Plane.ZY.offset(-0.41925930159213404)):
        with Locations((-2.9999999999999982, -95)):
            Rectangle(SKETCH11_W, SKETCH11_H)
    extrude(amount=BOSS_EXTRUDE6_DEPTH)

    # Sketch12 → Cut-Extrude7 (cut)
    with BuildSketch(Plane(origin=(0, -94, 0), x_dir=(1, 0, 0), z_dir=(0, 1, 0))):
        with Locations((-0.05000000000000317, 2.9999999999999982)):
            Circle(SKETCH12_R)
    extrude(amount=-CUT_EXTRUDE7_DEPTH, mode=Mode.SUBTRACT)

    # Fillet4
    fillet4_edges = [part.edges().sort_by_distance(p)[0] for p in [
        (0, -97.5, 9.5),
        (-2.69e-15, -103.00000000000001, 9.5),
    ]]
    fillet(fillet4_edges, radius=FILLET4_R)

    # Fillet6
    fillet6_edges = [part.edges().sort_by_distance(p)[0] for p in [
        (20.000000000000014, 0, 8.5),
        (0, 0, 8.5),
    ]]
    fillet(fillet6_edges, radius=FILLET6_R)

    # Sketch13 → Boss-Extrude7 (add)
    with BuildSketch(Plane.XY):
        with Locations(Location((9.9, -96.5, 0), (0, 0, 175.588274214))):
            Circle(SKETCH13_R)
        with Locations((9.9, -96.5)):
            Circle(SKETCH13_R_2, mode=Mode.SUBTRACT)
    extrude(amount=BOSS_EXTRUDE7_DEPTH)

    # Sketch14 → Cut-Extrude8 (cut)
    with BuildSketch(Plane(origin=(0, 0, -5.999999999999998), x_dir=(-1, 0, 0), z_dir=(0, 0, -1))):
        with Locations((-2.6248254853637345, -96.75)):
            Rectangle(SKETCH14_W, SKETCH14_H)
    extrude(amount=-CUT_EXTRUDE8_DEPTH, mode=Mode.SUBTRACT)

    # Sketch15 → Boss-Extrude8 (add)
    with BuildSketch(Plane.XY):
        Polygon((0, -97.5), (2.5, -97.5), (2.5000000000000013, -103.00000000000001), (0, -103.00000000000001), align=None)
    extrude(amount=BOSS_EXTRUDE8_DEPTH)

    # Sketch16 → Cut-Extrude9 (cut)
    with BuildSketch(Plane(origin=(0, 0, -5.999999999999998), x_dir=(-1, 0, 0), z_dir=(0, 0, -1))):
        with Locations((-9.9, -96.5)):
            Circle(SKETCH16_R)
    extrude(amount=-CUT_EXTRUDE9_DEPTH, mode=Mode.SUBTRACT)

    # Sketch17 → Cut-Extrude10 (cut)
    with BuildSketch(Plane(origin=(20.000000000000014, 0, 0), x_dir=(0, 0, -1), z_dir=(1, 0, 0))):
        Polygon((0, 0), (-7, -8.6e-16), (-6.9999999999999885, -89.75912634068962), (0, -89.75912634068962), align=None)
    extrude(amount=-CUT_EXTRUDE10_DEPTH, mode=Mode.SUBTRACT)

    # Sketch18 → Cut-Extrude11 (cut)
    with BuildSketch(Plane(origin=(0, 0, 2), x_dir=(-1, 0, 0), z_dir=(0, 0, -1))):
        with Locations((-39.000000000000014, -91)):
            Circle(SKETCH18_R)
    extrude(amount=-CUT_EXTRUDE11_DEPTH, mode=Mode.SUBTRACT)

    # Sketch20 → Cut-Extrude12 (cut)
    with BuildSketch(Plane(origin=(0, -110, 0), x_dir=(1, 0, 0), z_dir=(0, 1, 0))):
        with Locations(Location((37.50000000000002, -9.999999999999998, 0), (0, 0, 270))):
            Circle(SKETCH20_R)
        with Locations(Location((37.50000000000002, 0.9999999999999974, 0), (0, 0, 90))):
            Circle(SKETCH20_R)
    extrude(amount=-CUT_EXTRUDE12_DEPTH, mode=Mode.SUBTRACT)

    # Fillet7
    fillet7_edges = [part.edges().sort_by_distance(p)[0] for p in [
        (2.500000000000001, -100.25, 2),
        (2.500000000000001, -100.25, 0),
    ]]
    fillet(fillet7_edges, radius=FILLET7_R)

    # Fillet8
    fillet8_edges = [part.edges().sort_by_distance(p)[0] for p in [
        (12.142354869960766, -110, 2),
    ]]
    fillet(fillet8_edges, radius=FILLET8_R)

    # Fillet9
    fillet9_edges = [part.edges().sort_by_distance(p)[0] for p in [
        (3.899999999999995, -94, -2.9999999999999982),
    ]]
    fillet(fillet9_edges, radius=FILLET9_R)

    # Fillet10
    fillet10_edges = [part.edges().sort_by_distance(p)[0] for p in [
        (1.025000000000007, -103.00000000000001, 2),
    ]]
    fillet(fillet10_edges, radius=FILLET10_R)

    # Fillet11
    fillet11_edges = [part.edges().sort_by_distance(p)[0] for p in [
        (1.0250000000000057, -97.5, 2),
    ]]
    fillet(fillet11_edges, radius=FILLET11_R)

    # Sketch23 → Cut-Extrude15 (cut)
    with BuildSketch(Plane(origin=(20.000000000000014, 0, 0), x_dir=(0, 0, -1), z_dir=(1, 0, 0))):
        with BuildLine():
            Line((-7, -21.5), (-7, -28.499999999999996))
            Line((-7, -28.499999999999996), (-12.999999999999993, -28.499999999999996))
            ThreePointArc((-12.999999999999993, -28.499999999999996), (-13.707106781186548, -28.207106781186543), (-14, -27.49999999999999))
            Line((-14, -27.49999999999999), (-14, -22.500000000000007))
            ThreePointArc((-14, -22.500000000000007), (-13.707106781186548, -21.79289321881345), (-12.999999999999993, -21.5))
            Line((-12.999999999999993, -21.5), (-7, -21.5))
        make_face()
    extrude(amount=-CUT_EXTRUDE15_DEPTH, mode=Mode.SUBTRACT)

    # Sketch24 → Cut-Extrude16 (cut)
    with BuildSketch(Plane(origin=(18.000000000000014, 0, 0), x_dir=(0, 0, -1), z_dir=(1, 0, 0))):
        with Locations((-10.5, -24.999999999999996)):
            Circle(SKETCH24_R)
    extrude(amount=-CUT_EXTRUDE16_DEPTH, mode=Mode.SUBTRACT)


solid = part.part
